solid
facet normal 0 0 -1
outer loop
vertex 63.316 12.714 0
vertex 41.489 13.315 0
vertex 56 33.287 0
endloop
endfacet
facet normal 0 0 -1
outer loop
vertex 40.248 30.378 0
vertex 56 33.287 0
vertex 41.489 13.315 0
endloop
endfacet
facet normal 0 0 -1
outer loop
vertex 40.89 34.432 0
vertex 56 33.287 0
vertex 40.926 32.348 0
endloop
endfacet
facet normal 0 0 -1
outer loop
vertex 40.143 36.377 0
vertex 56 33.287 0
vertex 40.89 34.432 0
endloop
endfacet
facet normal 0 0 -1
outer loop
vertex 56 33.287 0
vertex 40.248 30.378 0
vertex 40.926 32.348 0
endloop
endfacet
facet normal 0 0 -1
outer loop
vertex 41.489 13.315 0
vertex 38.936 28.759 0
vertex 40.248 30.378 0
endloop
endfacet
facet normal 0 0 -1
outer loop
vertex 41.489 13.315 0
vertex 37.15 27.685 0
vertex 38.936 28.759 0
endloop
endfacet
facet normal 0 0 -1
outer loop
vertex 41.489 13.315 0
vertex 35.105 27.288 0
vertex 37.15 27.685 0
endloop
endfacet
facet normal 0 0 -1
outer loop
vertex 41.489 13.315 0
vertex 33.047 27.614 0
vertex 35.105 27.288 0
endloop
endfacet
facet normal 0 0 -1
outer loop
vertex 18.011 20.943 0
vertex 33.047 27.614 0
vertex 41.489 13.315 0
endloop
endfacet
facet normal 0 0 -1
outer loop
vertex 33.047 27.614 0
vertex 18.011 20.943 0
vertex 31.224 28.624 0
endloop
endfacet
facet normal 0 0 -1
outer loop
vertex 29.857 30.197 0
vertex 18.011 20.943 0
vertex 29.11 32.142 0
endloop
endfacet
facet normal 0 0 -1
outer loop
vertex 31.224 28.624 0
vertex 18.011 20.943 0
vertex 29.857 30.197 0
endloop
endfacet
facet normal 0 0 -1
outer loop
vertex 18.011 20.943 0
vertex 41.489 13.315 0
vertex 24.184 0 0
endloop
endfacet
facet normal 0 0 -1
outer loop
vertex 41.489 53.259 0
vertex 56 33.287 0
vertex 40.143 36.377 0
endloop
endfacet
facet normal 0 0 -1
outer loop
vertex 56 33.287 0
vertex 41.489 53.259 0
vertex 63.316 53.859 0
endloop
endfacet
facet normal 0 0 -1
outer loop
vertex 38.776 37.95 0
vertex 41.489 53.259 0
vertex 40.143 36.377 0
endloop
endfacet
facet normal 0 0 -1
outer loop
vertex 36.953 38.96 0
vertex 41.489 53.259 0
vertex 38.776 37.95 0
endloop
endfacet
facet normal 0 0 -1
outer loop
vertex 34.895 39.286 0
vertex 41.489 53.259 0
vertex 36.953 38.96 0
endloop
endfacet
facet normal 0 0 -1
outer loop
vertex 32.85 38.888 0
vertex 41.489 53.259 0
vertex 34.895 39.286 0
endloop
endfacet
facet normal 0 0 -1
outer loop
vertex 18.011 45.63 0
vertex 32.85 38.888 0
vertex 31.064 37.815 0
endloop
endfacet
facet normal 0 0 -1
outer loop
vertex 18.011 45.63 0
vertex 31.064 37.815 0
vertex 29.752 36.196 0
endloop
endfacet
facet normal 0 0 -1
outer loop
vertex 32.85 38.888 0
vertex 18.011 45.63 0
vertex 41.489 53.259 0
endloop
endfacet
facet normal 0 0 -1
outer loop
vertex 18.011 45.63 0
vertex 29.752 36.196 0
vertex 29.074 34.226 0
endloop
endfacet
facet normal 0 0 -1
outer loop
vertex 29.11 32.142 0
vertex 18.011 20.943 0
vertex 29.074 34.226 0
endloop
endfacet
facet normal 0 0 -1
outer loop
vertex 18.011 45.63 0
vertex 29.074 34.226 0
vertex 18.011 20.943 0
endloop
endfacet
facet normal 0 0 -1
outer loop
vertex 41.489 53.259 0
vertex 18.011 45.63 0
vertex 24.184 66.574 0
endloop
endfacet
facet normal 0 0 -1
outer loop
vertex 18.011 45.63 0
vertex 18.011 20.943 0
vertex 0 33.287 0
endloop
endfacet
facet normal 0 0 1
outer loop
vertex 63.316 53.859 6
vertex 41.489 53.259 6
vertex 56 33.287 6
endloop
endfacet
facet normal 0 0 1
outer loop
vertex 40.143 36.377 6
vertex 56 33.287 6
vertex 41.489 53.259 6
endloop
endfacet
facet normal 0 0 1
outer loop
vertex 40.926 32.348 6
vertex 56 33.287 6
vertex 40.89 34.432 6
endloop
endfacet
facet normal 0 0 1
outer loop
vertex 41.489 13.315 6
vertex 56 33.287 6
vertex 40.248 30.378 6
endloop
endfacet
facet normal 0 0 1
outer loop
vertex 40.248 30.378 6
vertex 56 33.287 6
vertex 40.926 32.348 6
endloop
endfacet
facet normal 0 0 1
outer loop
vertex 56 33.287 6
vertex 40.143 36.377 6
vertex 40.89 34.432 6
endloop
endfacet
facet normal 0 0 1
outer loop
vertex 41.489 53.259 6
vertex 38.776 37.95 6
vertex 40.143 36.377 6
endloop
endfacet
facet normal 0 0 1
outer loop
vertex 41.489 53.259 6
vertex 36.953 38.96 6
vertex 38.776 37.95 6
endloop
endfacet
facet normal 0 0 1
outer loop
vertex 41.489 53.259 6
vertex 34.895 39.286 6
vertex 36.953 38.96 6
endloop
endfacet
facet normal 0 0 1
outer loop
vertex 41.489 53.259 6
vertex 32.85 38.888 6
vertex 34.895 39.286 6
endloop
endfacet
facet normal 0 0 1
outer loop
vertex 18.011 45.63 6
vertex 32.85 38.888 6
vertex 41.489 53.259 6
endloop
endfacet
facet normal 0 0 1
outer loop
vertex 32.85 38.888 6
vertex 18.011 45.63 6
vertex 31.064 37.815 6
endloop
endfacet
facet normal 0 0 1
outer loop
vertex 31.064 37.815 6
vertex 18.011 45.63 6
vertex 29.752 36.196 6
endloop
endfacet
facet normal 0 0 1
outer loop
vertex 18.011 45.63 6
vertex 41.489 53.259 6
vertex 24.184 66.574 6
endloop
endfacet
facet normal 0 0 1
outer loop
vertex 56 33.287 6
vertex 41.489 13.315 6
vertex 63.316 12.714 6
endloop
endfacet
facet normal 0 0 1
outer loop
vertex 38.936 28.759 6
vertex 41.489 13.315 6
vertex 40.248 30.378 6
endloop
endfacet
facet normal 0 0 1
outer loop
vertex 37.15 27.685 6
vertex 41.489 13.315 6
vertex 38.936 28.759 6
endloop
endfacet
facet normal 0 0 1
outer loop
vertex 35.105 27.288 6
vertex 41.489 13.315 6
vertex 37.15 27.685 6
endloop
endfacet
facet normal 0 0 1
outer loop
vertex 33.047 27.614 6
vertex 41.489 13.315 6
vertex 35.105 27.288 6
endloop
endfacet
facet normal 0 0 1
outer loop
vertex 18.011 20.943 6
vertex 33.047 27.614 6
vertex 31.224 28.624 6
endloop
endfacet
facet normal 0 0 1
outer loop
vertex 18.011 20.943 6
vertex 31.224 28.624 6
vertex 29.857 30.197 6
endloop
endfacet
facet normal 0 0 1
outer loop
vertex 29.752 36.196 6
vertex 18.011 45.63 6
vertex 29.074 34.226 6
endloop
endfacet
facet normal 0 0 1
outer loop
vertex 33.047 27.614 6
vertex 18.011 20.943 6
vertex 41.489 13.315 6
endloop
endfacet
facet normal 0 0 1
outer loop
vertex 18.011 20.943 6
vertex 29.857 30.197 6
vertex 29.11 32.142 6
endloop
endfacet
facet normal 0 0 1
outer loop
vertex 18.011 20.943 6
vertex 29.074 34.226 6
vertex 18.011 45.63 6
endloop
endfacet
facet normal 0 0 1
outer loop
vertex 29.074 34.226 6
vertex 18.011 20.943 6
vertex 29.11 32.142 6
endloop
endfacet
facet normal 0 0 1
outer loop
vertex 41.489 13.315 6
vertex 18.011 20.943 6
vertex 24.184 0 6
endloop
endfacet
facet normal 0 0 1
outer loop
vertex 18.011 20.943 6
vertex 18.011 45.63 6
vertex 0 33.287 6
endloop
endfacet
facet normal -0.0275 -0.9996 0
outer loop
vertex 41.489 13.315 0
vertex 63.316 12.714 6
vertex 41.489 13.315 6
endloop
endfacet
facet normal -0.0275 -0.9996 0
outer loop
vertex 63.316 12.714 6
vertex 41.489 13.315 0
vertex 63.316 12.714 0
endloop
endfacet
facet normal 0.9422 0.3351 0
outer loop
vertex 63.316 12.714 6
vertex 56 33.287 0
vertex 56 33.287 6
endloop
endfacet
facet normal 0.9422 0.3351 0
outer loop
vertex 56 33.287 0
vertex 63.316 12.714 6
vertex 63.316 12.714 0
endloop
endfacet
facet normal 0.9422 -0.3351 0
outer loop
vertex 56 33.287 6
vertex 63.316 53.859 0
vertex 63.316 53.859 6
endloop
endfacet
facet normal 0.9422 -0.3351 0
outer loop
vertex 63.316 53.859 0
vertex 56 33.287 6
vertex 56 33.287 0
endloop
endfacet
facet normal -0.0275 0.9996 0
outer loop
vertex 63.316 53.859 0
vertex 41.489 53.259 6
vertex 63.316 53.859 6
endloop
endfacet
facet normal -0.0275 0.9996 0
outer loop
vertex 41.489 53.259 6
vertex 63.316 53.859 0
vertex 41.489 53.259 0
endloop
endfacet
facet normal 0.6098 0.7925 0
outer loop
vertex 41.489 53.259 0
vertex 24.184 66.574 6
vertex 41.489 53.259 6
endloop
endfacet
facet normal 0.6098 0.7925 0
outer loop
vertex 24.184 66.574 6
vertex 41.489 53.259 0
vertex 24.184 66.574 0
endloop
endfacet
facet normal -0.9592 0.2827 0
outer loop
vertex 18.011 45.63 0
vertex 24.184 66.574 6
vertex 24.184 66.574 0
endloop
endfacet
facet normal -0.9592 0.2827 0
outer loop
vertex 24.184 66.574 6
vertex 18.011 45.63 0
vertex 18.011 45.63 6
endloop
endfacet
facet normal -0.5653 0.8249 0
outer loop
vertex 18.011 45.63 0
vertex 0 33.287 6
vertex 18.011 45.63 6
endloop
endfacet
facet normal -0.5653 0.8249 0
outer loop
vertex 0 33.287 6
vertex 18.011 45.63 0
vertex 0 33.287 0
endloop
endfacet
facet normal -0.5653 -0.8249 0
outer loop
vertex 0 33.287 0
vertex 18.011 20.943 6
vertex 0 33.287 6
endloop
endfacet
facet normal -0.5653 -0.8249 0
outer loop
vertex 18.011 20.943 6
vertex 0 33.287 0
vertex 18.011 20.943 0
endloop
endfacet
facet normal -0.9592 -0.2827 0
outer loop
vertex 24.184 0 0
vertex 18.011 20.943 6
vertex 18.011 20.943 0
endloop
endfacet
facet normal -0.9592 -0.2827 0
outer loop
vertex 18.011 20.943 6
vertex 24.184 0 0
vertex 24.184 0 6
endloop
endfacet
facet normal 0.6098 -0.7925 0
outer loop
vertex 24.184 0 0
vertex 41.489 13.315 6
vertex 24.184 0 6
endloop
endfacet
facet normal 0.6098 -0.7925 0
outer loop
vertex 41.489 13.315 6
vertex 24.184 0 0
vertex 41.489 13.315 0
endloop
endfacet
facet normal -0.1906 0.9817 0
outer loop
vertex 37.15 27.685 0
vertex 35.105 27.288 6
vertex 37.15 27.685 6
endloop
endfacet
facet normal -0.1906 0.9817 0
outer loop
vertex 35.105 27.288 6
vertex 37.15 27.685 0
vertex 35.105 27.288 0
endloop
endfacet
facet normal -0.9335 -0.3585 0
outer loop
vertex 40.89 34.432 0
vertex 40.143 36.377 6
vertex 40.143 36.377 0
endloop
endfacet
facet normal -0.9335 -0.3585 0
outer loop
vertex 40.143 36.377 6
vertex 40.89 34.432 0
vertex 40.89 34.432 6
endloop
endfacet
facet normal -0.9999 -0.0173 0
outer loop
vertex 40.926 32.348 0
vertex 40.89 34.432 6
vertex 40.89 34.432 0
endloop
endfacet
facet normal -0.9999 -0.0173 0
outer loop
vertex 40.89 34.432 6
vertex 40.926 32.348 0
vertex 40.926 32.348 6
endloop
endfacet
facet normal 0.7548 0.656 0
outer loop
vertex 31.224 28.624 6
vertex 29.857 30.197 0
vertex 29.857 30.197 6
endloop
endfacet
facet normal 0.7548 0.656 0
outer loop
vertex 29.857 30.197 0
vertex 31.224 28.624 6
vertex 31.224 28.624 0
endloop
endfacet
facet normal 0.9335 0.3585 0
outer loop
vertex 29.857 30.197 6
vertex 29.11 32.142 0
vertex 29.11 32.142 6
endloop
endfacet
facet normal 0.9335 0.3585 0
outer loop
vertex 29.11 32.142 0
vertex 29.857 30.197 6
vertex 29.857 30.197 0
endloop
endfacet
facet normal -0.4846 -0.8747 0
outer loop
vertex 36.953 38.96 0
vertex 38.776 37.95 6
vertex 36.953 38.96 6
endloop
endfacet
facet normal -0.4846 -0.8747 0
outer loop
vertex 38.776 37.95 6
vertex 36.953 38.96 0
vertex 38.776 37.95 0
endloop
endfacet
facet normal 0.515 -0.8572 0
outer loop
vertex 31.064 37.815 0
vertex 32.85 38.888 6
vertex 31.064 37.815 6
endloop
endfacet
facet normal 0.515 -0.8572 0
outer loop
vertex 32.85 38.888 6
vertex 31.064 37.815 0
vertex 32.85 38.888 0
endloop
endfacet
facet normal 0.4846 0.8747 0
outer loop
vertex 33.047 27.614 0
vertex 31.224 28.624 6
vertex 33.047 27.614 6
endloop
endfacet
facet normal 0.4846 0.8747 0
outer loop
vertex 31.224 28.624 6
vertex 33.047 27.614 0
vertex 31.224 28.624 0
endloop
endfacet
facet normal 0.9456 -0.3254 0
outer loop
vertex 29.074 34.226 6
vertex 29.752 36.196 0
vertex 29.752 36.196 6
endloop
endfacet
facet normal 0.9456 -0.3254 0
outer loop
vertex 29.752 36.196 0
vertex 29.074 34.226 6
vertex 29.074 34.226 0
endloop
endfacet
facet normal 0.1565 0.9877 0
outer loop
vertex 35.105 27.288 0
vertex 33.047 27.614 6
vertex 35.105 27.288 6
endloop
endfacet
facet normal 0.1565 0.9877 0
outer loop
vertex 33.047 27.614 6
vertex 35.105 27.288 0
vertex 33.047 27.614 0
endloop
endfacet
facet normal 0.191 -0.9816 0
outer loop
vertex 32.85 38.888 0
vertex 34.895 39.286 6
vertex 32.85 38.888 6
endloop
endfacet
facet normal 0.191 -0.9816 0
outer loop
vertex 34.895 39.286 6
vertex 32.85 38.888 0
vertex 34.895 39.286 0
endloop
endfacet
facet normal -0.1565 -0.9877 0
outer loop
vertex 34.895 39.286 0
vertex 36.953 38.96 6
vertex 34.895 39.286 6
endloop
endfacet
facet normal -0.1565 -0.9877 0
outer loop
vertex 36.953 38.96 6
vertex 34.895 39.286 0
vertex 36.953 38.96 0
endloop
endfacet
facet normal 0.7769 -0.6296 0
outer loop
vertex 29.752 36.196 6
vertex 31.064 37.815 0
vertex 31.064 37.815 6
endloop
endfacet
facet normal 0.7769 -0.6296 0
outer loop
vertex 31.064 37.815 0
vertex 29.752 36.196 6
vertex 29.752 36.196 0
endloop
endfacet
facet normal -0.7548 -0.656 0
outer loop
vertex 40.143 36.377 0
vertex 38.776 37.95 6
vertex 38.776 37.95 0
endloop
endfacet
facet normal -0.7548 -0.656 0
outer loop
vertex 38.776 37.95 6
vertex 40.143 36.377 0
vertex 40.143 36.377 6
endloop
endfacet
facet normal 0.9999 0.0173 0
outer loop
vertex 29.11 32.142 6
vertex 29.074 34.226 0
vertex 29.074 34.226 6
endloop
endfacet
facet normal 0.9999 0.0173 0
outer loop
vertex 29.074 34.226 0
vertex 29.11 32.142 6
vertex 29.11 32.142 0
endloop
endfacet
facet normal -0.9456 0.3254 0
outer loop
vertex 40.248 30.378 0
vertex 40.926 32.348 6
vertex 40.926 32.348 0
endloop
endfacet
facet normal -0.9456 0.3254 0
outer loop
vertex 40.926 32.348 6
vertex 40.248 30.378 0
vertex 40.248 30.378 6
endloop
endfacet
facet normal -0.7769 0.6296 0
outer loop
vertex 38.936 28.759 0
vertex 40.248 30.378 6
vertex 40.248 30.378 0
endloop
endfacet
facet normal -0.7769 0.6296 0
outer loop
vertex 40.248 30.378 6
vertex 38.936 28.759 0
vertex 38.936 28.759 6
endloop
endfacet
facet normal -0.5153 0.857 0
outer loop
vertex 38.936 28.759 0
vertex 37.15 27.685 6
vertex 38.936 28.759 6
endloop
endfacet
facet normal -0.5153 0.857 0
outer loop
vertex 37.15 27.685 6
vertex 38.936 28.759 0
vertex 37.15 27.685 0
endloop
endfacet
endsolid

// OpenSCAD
$fn = 32;

// ----------------------------------------------------------------------
// Star wheel: 5-point blunt, R35
// ----------------------------------------------------------------------

// --- parameters (mm) ---
n_points = 5;             // number of points / teeth
r_out = 35;               // tip radius
r_in = 21;                // root radius
bore_r = 6;               // centre bore radius
plate_t = 6;              // plate thickness, Z (extrusion height)
bore_d = 12;              // centre bore diameter

profile = [[0, 33.287], [18.011, 20.943], [24.184, 0], [41.489, 13.315], [63.316, 12.714], [56, 33.287], [63.316, 53.859], [41.489, 53.259], [24.184, 66.574], [18.011, 45.63]];  // primary outline, 10 points, counter clockwise
void_1 = [[40.89, 34.432], [40.143, 36.377], [38.776, 37.95], [36.953, 38.96], [34.895, 39.286], [32.85, 38.888], [31.064, 37.815], [29.752, 36.196], [29.074, 34.226], [29.11, 32.142], [29.857, 30.197], [31.224, 28.624], [33.047, 27.614], [35.105, 27.288], [37.15, 27.685], [38.936, 28.759], [40.248, 30.378], [40.926, 32.348]];  // centre bore, 18 points

// --- the one profile operation ---
difference() {
  linear_extrude(height = plate_t) polygon(points = profile);
  translate([0, 0, -1])
    linear_extrude(height = plate_t + 2) polygon(points = void_1);
}
